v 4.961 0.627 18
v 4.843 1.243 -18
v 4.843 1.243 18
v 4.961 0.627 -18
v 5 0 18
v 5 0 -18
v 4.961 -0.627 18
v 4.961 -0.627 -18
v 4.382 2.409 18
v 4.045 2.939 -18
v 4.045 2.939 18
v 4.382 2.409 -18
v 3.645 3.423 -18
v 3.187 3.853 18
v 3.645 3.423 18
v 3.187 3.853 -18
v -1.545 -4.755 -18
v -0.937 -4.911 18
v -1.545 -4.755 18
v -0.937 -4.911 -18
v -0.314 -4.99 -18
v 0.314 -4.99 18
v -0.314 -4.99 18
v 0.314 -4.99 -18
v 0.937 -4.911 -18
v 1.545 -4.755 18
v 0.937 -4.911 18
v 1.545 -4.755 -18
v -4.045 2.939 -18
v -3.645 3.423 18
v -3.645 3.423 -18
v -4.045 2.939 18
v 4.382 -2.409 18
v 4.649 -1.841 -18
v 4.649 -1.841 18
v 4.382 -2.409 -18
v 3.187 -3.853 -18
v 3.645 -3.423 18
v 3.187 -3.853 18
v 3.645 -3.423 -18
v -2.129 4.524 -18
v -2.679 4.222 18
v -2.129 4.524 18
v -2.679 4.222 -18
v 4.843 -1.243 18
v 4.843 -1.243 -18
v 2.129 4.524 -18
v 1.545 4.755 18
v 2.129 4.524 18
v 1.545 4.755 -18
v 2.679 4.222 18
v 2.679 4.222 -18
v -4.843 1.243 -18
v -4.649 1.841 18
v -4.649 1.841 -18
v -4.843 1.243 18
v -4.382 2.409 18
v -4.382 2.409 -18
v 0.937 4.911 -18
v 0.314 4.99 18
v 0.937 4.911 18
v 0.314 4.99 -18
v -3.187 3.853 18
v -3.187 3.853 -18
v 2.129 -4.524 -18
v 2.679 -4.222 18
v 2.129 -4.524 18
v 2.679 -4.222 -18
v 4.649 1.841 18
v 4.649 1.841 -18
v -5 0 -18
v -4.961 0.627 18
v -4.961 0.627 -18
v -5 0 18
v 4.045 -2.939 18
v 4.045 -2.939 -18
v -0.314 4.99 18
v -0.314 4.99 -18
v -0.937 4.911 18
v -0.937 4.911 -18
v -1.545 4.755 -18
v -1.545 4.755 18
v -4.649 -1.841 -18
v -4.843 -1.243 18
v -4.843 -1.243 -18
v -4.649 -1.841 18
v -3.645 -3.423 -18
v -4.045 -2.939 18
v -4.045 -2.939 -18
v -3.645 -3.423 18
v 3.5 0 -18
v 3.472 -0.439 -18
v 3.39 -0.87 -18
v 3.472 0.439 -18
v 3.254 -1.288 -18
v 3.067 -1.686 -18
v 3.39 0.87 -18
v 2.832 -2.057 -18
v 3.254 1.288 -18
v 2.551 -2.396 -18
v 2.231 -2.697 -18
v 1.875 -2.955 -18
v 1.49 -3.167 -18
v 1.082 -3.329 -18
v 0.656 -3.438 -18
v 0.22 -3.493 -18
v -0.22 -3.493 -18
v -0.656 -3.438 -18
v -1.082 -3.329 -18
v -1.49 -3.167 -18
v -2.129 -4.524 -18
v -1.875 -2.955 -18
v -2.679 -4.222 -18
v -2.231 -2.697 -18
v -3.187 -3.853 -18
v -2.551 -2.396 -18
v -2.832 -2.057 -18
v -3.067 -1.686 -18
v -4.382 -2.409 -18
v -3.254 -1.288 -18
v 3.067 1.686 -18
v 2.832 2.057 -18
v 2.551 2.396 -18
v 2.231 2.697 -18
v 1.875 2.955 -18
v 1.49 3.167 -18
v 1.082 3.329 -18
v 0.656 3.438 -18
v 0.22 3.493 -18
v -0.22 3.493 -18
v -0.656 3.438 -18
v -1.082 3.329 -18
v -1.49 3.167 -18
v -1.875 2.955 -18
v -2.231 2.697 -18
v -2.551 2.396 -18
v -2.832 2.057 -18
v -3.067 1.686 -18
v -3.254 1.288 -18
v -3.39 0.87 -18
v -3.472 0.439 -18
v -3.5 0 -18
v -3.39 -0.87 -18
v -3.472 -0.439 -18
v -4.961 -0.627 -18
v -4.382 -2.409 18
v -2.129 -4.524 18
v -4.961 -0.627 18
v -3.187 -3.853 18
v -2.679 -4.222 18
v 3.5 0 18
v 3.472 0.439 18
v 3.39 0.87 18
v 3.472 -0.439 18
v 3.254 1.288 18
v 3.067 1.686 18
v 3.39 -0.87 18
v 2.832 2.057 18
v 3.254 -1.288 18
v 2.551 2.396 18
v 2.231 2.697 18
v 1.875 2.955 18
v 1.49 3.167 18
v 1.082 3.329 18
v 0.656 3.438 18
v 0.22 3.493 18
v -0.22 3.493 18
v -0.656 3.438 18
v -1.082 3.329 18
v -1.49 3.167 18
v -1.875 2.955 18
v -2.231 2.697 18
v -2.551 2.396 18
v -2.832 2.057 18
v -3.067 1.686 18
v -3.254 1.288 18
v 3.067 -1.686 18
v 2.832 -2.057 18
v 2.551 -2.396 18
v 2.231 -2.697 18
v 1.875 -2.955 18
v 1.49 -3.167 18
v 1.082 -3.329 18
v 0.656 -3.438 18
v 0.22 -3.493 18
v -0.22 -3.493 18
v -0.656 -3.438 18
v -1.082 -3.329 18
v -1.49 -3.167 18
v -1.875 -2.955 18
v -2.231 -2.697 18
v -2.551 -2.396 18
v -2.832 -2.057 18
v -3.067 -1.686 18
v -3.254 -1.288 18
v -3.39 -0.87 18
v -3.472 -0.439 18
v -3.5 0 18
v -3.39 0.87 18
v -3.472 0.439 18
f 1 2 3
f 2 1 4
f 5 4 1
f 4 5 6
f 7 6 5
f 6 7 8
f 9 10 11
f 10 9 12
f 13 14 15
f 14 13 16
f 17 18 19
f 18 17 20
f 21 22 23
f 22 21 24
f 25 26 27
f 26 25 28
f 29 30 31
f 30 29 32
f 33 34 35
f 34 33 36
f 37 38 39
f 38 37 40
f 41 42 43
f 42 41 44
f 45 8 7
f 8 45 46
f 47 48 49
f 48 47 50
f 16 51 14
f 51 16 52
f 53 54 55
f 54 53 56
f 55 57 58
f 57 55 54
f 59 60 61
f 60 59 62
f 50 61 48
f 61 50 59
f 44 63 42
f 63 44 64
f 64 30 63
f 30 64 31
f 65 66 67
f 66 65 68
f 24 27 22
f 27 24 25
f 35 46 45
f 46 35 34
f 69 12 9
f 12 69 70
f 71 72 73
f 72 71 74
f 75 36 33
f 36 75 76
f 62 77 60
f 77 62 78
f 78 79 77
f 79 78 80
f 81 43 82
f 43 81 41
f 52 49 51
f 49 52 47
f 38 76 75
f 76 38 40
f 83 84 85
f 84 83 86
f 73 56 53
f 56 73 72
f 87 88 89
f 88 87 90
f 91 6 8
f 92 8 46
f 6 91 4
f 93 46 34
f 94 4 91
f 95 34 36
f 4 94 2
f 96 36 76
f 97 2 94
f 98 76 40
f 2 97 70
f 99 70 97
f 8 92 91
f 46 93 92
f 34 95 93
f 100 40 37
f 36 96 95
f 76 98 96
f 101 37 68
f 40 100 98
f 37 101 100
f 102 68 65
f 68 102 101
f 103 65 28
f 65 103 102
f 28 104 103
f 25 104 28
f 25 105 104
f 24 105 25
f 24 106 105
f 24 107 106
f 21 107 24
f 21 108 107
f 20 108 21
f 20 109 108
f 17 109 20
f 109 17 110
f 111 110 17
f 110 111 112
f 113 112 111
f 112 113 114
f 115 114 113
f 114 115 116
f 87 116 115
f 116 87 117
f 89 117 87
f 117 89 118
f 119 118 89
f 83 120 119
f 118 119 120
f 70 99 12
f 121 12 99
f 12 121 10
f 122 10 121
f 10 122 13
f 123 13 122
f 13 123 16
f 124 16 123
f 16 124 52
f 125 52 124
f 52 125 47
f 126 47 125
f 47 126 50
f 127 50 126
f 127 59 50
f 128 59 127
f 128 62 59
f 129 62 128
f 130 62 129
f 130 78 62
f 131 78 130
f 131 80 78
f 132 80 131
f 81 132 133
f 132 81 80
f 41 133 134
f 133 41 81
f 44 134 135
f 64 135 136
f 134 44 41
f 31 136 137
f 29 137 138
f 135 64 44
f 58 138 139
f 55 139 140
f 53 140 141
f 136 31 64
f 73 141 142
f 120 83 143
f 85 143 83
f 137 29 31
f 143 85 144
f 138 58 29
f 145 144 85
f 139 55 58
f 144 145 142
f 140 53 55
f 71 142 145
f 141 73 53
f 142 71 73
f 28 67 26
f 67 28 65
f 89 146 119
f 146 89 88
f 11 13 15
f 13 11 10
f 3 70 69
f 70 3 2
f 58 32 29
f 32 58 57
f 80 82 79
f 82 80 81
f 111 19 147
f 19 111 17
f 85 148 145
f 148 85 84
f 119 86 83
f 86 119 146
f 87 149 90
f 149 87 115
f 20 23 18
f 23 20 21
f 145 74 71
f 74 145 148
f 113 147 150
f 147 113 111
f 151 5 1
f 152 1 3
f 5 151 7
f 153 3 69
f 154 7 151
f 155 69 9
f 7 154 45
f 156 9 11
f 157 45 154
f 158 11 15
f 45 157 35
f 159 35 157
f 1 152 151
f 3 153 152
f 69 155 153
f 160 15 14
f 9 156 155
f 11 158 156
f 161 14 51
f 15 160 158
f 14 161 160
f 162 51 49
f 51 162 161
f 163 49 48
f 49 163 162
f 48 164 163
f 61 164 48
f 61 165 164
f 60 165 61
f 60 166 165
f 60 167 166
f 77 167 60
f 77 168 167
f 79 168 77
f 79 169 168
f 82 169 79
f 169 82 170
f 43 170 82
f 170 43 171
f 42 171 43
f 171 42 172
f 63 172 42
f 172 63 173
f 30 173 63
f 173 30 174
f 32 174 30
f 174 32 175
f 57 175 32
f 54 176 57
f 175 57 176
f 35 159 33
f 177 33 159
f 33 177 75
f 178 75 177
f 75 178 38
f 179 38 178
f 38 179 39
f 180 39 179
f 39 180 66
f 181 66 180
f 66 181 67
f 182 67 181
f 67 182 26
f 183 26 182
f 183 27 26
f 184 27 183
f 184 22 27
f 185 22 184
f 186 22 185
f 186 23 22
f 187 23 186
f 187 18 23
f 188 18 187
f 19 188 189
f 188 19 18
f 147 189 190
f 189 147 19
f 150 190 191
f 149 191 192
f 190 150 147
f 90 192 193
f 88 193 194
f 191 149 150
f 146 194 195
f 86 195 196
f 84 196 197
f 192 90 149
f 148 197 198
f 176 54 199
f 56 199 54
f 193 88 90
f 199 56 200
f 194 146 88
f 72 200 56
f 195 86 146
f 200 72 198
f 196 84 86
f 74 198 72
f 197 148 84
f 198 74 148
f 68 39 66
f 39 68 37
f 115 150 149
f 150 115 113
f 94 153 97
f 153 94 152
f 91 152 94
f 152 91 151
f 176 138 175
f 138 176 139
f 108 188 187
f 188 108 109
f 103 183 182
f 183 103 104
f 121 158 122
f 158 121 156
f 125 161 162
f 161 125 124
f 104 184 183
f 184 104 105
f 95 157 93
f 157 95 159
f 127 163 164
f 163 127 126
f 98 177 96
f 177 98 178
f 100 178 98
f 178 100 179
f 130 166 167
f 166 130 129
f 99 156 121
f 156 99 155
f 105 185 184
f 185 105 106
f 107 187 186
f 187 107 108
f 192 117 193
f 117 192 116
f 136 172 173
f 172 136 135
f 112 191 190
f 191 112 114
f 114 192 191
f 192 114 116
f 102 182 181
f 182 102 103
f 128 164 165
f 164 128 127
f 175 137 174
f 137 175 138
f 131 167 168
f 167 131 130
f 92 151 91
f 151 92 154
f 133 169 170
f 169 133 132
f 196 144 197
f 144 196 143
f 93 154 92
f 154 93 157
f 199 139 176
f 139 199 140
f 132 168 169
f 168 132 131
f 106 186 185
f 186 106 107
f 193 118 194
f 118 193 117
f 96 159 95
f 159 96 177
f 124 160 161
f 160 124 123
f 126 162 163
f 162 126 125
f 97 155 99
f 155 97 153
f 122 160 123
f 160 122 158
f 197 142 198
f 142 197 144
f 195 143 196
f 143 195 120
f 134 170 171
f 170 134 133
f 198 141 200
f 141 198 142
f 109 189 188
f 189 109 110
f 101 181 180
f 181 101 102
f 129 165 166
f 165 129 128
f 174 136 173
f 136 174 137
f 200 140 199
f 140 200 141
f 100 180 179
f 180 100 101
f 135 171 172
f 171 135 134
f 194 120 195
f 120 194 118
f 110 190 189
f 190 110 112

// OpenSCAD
$fn = 50;


difference() {
	union() {
		translate(v = [0, 0, -18.0000000000]) {
			cylinder(h = 36, r = 5.0000000000);
		}
	}
	union() {
		translate(v = [0, 0, -100.0000000000]) {
			cylinder(h = 200, r = 3.5000000000);
		}
	}
}
